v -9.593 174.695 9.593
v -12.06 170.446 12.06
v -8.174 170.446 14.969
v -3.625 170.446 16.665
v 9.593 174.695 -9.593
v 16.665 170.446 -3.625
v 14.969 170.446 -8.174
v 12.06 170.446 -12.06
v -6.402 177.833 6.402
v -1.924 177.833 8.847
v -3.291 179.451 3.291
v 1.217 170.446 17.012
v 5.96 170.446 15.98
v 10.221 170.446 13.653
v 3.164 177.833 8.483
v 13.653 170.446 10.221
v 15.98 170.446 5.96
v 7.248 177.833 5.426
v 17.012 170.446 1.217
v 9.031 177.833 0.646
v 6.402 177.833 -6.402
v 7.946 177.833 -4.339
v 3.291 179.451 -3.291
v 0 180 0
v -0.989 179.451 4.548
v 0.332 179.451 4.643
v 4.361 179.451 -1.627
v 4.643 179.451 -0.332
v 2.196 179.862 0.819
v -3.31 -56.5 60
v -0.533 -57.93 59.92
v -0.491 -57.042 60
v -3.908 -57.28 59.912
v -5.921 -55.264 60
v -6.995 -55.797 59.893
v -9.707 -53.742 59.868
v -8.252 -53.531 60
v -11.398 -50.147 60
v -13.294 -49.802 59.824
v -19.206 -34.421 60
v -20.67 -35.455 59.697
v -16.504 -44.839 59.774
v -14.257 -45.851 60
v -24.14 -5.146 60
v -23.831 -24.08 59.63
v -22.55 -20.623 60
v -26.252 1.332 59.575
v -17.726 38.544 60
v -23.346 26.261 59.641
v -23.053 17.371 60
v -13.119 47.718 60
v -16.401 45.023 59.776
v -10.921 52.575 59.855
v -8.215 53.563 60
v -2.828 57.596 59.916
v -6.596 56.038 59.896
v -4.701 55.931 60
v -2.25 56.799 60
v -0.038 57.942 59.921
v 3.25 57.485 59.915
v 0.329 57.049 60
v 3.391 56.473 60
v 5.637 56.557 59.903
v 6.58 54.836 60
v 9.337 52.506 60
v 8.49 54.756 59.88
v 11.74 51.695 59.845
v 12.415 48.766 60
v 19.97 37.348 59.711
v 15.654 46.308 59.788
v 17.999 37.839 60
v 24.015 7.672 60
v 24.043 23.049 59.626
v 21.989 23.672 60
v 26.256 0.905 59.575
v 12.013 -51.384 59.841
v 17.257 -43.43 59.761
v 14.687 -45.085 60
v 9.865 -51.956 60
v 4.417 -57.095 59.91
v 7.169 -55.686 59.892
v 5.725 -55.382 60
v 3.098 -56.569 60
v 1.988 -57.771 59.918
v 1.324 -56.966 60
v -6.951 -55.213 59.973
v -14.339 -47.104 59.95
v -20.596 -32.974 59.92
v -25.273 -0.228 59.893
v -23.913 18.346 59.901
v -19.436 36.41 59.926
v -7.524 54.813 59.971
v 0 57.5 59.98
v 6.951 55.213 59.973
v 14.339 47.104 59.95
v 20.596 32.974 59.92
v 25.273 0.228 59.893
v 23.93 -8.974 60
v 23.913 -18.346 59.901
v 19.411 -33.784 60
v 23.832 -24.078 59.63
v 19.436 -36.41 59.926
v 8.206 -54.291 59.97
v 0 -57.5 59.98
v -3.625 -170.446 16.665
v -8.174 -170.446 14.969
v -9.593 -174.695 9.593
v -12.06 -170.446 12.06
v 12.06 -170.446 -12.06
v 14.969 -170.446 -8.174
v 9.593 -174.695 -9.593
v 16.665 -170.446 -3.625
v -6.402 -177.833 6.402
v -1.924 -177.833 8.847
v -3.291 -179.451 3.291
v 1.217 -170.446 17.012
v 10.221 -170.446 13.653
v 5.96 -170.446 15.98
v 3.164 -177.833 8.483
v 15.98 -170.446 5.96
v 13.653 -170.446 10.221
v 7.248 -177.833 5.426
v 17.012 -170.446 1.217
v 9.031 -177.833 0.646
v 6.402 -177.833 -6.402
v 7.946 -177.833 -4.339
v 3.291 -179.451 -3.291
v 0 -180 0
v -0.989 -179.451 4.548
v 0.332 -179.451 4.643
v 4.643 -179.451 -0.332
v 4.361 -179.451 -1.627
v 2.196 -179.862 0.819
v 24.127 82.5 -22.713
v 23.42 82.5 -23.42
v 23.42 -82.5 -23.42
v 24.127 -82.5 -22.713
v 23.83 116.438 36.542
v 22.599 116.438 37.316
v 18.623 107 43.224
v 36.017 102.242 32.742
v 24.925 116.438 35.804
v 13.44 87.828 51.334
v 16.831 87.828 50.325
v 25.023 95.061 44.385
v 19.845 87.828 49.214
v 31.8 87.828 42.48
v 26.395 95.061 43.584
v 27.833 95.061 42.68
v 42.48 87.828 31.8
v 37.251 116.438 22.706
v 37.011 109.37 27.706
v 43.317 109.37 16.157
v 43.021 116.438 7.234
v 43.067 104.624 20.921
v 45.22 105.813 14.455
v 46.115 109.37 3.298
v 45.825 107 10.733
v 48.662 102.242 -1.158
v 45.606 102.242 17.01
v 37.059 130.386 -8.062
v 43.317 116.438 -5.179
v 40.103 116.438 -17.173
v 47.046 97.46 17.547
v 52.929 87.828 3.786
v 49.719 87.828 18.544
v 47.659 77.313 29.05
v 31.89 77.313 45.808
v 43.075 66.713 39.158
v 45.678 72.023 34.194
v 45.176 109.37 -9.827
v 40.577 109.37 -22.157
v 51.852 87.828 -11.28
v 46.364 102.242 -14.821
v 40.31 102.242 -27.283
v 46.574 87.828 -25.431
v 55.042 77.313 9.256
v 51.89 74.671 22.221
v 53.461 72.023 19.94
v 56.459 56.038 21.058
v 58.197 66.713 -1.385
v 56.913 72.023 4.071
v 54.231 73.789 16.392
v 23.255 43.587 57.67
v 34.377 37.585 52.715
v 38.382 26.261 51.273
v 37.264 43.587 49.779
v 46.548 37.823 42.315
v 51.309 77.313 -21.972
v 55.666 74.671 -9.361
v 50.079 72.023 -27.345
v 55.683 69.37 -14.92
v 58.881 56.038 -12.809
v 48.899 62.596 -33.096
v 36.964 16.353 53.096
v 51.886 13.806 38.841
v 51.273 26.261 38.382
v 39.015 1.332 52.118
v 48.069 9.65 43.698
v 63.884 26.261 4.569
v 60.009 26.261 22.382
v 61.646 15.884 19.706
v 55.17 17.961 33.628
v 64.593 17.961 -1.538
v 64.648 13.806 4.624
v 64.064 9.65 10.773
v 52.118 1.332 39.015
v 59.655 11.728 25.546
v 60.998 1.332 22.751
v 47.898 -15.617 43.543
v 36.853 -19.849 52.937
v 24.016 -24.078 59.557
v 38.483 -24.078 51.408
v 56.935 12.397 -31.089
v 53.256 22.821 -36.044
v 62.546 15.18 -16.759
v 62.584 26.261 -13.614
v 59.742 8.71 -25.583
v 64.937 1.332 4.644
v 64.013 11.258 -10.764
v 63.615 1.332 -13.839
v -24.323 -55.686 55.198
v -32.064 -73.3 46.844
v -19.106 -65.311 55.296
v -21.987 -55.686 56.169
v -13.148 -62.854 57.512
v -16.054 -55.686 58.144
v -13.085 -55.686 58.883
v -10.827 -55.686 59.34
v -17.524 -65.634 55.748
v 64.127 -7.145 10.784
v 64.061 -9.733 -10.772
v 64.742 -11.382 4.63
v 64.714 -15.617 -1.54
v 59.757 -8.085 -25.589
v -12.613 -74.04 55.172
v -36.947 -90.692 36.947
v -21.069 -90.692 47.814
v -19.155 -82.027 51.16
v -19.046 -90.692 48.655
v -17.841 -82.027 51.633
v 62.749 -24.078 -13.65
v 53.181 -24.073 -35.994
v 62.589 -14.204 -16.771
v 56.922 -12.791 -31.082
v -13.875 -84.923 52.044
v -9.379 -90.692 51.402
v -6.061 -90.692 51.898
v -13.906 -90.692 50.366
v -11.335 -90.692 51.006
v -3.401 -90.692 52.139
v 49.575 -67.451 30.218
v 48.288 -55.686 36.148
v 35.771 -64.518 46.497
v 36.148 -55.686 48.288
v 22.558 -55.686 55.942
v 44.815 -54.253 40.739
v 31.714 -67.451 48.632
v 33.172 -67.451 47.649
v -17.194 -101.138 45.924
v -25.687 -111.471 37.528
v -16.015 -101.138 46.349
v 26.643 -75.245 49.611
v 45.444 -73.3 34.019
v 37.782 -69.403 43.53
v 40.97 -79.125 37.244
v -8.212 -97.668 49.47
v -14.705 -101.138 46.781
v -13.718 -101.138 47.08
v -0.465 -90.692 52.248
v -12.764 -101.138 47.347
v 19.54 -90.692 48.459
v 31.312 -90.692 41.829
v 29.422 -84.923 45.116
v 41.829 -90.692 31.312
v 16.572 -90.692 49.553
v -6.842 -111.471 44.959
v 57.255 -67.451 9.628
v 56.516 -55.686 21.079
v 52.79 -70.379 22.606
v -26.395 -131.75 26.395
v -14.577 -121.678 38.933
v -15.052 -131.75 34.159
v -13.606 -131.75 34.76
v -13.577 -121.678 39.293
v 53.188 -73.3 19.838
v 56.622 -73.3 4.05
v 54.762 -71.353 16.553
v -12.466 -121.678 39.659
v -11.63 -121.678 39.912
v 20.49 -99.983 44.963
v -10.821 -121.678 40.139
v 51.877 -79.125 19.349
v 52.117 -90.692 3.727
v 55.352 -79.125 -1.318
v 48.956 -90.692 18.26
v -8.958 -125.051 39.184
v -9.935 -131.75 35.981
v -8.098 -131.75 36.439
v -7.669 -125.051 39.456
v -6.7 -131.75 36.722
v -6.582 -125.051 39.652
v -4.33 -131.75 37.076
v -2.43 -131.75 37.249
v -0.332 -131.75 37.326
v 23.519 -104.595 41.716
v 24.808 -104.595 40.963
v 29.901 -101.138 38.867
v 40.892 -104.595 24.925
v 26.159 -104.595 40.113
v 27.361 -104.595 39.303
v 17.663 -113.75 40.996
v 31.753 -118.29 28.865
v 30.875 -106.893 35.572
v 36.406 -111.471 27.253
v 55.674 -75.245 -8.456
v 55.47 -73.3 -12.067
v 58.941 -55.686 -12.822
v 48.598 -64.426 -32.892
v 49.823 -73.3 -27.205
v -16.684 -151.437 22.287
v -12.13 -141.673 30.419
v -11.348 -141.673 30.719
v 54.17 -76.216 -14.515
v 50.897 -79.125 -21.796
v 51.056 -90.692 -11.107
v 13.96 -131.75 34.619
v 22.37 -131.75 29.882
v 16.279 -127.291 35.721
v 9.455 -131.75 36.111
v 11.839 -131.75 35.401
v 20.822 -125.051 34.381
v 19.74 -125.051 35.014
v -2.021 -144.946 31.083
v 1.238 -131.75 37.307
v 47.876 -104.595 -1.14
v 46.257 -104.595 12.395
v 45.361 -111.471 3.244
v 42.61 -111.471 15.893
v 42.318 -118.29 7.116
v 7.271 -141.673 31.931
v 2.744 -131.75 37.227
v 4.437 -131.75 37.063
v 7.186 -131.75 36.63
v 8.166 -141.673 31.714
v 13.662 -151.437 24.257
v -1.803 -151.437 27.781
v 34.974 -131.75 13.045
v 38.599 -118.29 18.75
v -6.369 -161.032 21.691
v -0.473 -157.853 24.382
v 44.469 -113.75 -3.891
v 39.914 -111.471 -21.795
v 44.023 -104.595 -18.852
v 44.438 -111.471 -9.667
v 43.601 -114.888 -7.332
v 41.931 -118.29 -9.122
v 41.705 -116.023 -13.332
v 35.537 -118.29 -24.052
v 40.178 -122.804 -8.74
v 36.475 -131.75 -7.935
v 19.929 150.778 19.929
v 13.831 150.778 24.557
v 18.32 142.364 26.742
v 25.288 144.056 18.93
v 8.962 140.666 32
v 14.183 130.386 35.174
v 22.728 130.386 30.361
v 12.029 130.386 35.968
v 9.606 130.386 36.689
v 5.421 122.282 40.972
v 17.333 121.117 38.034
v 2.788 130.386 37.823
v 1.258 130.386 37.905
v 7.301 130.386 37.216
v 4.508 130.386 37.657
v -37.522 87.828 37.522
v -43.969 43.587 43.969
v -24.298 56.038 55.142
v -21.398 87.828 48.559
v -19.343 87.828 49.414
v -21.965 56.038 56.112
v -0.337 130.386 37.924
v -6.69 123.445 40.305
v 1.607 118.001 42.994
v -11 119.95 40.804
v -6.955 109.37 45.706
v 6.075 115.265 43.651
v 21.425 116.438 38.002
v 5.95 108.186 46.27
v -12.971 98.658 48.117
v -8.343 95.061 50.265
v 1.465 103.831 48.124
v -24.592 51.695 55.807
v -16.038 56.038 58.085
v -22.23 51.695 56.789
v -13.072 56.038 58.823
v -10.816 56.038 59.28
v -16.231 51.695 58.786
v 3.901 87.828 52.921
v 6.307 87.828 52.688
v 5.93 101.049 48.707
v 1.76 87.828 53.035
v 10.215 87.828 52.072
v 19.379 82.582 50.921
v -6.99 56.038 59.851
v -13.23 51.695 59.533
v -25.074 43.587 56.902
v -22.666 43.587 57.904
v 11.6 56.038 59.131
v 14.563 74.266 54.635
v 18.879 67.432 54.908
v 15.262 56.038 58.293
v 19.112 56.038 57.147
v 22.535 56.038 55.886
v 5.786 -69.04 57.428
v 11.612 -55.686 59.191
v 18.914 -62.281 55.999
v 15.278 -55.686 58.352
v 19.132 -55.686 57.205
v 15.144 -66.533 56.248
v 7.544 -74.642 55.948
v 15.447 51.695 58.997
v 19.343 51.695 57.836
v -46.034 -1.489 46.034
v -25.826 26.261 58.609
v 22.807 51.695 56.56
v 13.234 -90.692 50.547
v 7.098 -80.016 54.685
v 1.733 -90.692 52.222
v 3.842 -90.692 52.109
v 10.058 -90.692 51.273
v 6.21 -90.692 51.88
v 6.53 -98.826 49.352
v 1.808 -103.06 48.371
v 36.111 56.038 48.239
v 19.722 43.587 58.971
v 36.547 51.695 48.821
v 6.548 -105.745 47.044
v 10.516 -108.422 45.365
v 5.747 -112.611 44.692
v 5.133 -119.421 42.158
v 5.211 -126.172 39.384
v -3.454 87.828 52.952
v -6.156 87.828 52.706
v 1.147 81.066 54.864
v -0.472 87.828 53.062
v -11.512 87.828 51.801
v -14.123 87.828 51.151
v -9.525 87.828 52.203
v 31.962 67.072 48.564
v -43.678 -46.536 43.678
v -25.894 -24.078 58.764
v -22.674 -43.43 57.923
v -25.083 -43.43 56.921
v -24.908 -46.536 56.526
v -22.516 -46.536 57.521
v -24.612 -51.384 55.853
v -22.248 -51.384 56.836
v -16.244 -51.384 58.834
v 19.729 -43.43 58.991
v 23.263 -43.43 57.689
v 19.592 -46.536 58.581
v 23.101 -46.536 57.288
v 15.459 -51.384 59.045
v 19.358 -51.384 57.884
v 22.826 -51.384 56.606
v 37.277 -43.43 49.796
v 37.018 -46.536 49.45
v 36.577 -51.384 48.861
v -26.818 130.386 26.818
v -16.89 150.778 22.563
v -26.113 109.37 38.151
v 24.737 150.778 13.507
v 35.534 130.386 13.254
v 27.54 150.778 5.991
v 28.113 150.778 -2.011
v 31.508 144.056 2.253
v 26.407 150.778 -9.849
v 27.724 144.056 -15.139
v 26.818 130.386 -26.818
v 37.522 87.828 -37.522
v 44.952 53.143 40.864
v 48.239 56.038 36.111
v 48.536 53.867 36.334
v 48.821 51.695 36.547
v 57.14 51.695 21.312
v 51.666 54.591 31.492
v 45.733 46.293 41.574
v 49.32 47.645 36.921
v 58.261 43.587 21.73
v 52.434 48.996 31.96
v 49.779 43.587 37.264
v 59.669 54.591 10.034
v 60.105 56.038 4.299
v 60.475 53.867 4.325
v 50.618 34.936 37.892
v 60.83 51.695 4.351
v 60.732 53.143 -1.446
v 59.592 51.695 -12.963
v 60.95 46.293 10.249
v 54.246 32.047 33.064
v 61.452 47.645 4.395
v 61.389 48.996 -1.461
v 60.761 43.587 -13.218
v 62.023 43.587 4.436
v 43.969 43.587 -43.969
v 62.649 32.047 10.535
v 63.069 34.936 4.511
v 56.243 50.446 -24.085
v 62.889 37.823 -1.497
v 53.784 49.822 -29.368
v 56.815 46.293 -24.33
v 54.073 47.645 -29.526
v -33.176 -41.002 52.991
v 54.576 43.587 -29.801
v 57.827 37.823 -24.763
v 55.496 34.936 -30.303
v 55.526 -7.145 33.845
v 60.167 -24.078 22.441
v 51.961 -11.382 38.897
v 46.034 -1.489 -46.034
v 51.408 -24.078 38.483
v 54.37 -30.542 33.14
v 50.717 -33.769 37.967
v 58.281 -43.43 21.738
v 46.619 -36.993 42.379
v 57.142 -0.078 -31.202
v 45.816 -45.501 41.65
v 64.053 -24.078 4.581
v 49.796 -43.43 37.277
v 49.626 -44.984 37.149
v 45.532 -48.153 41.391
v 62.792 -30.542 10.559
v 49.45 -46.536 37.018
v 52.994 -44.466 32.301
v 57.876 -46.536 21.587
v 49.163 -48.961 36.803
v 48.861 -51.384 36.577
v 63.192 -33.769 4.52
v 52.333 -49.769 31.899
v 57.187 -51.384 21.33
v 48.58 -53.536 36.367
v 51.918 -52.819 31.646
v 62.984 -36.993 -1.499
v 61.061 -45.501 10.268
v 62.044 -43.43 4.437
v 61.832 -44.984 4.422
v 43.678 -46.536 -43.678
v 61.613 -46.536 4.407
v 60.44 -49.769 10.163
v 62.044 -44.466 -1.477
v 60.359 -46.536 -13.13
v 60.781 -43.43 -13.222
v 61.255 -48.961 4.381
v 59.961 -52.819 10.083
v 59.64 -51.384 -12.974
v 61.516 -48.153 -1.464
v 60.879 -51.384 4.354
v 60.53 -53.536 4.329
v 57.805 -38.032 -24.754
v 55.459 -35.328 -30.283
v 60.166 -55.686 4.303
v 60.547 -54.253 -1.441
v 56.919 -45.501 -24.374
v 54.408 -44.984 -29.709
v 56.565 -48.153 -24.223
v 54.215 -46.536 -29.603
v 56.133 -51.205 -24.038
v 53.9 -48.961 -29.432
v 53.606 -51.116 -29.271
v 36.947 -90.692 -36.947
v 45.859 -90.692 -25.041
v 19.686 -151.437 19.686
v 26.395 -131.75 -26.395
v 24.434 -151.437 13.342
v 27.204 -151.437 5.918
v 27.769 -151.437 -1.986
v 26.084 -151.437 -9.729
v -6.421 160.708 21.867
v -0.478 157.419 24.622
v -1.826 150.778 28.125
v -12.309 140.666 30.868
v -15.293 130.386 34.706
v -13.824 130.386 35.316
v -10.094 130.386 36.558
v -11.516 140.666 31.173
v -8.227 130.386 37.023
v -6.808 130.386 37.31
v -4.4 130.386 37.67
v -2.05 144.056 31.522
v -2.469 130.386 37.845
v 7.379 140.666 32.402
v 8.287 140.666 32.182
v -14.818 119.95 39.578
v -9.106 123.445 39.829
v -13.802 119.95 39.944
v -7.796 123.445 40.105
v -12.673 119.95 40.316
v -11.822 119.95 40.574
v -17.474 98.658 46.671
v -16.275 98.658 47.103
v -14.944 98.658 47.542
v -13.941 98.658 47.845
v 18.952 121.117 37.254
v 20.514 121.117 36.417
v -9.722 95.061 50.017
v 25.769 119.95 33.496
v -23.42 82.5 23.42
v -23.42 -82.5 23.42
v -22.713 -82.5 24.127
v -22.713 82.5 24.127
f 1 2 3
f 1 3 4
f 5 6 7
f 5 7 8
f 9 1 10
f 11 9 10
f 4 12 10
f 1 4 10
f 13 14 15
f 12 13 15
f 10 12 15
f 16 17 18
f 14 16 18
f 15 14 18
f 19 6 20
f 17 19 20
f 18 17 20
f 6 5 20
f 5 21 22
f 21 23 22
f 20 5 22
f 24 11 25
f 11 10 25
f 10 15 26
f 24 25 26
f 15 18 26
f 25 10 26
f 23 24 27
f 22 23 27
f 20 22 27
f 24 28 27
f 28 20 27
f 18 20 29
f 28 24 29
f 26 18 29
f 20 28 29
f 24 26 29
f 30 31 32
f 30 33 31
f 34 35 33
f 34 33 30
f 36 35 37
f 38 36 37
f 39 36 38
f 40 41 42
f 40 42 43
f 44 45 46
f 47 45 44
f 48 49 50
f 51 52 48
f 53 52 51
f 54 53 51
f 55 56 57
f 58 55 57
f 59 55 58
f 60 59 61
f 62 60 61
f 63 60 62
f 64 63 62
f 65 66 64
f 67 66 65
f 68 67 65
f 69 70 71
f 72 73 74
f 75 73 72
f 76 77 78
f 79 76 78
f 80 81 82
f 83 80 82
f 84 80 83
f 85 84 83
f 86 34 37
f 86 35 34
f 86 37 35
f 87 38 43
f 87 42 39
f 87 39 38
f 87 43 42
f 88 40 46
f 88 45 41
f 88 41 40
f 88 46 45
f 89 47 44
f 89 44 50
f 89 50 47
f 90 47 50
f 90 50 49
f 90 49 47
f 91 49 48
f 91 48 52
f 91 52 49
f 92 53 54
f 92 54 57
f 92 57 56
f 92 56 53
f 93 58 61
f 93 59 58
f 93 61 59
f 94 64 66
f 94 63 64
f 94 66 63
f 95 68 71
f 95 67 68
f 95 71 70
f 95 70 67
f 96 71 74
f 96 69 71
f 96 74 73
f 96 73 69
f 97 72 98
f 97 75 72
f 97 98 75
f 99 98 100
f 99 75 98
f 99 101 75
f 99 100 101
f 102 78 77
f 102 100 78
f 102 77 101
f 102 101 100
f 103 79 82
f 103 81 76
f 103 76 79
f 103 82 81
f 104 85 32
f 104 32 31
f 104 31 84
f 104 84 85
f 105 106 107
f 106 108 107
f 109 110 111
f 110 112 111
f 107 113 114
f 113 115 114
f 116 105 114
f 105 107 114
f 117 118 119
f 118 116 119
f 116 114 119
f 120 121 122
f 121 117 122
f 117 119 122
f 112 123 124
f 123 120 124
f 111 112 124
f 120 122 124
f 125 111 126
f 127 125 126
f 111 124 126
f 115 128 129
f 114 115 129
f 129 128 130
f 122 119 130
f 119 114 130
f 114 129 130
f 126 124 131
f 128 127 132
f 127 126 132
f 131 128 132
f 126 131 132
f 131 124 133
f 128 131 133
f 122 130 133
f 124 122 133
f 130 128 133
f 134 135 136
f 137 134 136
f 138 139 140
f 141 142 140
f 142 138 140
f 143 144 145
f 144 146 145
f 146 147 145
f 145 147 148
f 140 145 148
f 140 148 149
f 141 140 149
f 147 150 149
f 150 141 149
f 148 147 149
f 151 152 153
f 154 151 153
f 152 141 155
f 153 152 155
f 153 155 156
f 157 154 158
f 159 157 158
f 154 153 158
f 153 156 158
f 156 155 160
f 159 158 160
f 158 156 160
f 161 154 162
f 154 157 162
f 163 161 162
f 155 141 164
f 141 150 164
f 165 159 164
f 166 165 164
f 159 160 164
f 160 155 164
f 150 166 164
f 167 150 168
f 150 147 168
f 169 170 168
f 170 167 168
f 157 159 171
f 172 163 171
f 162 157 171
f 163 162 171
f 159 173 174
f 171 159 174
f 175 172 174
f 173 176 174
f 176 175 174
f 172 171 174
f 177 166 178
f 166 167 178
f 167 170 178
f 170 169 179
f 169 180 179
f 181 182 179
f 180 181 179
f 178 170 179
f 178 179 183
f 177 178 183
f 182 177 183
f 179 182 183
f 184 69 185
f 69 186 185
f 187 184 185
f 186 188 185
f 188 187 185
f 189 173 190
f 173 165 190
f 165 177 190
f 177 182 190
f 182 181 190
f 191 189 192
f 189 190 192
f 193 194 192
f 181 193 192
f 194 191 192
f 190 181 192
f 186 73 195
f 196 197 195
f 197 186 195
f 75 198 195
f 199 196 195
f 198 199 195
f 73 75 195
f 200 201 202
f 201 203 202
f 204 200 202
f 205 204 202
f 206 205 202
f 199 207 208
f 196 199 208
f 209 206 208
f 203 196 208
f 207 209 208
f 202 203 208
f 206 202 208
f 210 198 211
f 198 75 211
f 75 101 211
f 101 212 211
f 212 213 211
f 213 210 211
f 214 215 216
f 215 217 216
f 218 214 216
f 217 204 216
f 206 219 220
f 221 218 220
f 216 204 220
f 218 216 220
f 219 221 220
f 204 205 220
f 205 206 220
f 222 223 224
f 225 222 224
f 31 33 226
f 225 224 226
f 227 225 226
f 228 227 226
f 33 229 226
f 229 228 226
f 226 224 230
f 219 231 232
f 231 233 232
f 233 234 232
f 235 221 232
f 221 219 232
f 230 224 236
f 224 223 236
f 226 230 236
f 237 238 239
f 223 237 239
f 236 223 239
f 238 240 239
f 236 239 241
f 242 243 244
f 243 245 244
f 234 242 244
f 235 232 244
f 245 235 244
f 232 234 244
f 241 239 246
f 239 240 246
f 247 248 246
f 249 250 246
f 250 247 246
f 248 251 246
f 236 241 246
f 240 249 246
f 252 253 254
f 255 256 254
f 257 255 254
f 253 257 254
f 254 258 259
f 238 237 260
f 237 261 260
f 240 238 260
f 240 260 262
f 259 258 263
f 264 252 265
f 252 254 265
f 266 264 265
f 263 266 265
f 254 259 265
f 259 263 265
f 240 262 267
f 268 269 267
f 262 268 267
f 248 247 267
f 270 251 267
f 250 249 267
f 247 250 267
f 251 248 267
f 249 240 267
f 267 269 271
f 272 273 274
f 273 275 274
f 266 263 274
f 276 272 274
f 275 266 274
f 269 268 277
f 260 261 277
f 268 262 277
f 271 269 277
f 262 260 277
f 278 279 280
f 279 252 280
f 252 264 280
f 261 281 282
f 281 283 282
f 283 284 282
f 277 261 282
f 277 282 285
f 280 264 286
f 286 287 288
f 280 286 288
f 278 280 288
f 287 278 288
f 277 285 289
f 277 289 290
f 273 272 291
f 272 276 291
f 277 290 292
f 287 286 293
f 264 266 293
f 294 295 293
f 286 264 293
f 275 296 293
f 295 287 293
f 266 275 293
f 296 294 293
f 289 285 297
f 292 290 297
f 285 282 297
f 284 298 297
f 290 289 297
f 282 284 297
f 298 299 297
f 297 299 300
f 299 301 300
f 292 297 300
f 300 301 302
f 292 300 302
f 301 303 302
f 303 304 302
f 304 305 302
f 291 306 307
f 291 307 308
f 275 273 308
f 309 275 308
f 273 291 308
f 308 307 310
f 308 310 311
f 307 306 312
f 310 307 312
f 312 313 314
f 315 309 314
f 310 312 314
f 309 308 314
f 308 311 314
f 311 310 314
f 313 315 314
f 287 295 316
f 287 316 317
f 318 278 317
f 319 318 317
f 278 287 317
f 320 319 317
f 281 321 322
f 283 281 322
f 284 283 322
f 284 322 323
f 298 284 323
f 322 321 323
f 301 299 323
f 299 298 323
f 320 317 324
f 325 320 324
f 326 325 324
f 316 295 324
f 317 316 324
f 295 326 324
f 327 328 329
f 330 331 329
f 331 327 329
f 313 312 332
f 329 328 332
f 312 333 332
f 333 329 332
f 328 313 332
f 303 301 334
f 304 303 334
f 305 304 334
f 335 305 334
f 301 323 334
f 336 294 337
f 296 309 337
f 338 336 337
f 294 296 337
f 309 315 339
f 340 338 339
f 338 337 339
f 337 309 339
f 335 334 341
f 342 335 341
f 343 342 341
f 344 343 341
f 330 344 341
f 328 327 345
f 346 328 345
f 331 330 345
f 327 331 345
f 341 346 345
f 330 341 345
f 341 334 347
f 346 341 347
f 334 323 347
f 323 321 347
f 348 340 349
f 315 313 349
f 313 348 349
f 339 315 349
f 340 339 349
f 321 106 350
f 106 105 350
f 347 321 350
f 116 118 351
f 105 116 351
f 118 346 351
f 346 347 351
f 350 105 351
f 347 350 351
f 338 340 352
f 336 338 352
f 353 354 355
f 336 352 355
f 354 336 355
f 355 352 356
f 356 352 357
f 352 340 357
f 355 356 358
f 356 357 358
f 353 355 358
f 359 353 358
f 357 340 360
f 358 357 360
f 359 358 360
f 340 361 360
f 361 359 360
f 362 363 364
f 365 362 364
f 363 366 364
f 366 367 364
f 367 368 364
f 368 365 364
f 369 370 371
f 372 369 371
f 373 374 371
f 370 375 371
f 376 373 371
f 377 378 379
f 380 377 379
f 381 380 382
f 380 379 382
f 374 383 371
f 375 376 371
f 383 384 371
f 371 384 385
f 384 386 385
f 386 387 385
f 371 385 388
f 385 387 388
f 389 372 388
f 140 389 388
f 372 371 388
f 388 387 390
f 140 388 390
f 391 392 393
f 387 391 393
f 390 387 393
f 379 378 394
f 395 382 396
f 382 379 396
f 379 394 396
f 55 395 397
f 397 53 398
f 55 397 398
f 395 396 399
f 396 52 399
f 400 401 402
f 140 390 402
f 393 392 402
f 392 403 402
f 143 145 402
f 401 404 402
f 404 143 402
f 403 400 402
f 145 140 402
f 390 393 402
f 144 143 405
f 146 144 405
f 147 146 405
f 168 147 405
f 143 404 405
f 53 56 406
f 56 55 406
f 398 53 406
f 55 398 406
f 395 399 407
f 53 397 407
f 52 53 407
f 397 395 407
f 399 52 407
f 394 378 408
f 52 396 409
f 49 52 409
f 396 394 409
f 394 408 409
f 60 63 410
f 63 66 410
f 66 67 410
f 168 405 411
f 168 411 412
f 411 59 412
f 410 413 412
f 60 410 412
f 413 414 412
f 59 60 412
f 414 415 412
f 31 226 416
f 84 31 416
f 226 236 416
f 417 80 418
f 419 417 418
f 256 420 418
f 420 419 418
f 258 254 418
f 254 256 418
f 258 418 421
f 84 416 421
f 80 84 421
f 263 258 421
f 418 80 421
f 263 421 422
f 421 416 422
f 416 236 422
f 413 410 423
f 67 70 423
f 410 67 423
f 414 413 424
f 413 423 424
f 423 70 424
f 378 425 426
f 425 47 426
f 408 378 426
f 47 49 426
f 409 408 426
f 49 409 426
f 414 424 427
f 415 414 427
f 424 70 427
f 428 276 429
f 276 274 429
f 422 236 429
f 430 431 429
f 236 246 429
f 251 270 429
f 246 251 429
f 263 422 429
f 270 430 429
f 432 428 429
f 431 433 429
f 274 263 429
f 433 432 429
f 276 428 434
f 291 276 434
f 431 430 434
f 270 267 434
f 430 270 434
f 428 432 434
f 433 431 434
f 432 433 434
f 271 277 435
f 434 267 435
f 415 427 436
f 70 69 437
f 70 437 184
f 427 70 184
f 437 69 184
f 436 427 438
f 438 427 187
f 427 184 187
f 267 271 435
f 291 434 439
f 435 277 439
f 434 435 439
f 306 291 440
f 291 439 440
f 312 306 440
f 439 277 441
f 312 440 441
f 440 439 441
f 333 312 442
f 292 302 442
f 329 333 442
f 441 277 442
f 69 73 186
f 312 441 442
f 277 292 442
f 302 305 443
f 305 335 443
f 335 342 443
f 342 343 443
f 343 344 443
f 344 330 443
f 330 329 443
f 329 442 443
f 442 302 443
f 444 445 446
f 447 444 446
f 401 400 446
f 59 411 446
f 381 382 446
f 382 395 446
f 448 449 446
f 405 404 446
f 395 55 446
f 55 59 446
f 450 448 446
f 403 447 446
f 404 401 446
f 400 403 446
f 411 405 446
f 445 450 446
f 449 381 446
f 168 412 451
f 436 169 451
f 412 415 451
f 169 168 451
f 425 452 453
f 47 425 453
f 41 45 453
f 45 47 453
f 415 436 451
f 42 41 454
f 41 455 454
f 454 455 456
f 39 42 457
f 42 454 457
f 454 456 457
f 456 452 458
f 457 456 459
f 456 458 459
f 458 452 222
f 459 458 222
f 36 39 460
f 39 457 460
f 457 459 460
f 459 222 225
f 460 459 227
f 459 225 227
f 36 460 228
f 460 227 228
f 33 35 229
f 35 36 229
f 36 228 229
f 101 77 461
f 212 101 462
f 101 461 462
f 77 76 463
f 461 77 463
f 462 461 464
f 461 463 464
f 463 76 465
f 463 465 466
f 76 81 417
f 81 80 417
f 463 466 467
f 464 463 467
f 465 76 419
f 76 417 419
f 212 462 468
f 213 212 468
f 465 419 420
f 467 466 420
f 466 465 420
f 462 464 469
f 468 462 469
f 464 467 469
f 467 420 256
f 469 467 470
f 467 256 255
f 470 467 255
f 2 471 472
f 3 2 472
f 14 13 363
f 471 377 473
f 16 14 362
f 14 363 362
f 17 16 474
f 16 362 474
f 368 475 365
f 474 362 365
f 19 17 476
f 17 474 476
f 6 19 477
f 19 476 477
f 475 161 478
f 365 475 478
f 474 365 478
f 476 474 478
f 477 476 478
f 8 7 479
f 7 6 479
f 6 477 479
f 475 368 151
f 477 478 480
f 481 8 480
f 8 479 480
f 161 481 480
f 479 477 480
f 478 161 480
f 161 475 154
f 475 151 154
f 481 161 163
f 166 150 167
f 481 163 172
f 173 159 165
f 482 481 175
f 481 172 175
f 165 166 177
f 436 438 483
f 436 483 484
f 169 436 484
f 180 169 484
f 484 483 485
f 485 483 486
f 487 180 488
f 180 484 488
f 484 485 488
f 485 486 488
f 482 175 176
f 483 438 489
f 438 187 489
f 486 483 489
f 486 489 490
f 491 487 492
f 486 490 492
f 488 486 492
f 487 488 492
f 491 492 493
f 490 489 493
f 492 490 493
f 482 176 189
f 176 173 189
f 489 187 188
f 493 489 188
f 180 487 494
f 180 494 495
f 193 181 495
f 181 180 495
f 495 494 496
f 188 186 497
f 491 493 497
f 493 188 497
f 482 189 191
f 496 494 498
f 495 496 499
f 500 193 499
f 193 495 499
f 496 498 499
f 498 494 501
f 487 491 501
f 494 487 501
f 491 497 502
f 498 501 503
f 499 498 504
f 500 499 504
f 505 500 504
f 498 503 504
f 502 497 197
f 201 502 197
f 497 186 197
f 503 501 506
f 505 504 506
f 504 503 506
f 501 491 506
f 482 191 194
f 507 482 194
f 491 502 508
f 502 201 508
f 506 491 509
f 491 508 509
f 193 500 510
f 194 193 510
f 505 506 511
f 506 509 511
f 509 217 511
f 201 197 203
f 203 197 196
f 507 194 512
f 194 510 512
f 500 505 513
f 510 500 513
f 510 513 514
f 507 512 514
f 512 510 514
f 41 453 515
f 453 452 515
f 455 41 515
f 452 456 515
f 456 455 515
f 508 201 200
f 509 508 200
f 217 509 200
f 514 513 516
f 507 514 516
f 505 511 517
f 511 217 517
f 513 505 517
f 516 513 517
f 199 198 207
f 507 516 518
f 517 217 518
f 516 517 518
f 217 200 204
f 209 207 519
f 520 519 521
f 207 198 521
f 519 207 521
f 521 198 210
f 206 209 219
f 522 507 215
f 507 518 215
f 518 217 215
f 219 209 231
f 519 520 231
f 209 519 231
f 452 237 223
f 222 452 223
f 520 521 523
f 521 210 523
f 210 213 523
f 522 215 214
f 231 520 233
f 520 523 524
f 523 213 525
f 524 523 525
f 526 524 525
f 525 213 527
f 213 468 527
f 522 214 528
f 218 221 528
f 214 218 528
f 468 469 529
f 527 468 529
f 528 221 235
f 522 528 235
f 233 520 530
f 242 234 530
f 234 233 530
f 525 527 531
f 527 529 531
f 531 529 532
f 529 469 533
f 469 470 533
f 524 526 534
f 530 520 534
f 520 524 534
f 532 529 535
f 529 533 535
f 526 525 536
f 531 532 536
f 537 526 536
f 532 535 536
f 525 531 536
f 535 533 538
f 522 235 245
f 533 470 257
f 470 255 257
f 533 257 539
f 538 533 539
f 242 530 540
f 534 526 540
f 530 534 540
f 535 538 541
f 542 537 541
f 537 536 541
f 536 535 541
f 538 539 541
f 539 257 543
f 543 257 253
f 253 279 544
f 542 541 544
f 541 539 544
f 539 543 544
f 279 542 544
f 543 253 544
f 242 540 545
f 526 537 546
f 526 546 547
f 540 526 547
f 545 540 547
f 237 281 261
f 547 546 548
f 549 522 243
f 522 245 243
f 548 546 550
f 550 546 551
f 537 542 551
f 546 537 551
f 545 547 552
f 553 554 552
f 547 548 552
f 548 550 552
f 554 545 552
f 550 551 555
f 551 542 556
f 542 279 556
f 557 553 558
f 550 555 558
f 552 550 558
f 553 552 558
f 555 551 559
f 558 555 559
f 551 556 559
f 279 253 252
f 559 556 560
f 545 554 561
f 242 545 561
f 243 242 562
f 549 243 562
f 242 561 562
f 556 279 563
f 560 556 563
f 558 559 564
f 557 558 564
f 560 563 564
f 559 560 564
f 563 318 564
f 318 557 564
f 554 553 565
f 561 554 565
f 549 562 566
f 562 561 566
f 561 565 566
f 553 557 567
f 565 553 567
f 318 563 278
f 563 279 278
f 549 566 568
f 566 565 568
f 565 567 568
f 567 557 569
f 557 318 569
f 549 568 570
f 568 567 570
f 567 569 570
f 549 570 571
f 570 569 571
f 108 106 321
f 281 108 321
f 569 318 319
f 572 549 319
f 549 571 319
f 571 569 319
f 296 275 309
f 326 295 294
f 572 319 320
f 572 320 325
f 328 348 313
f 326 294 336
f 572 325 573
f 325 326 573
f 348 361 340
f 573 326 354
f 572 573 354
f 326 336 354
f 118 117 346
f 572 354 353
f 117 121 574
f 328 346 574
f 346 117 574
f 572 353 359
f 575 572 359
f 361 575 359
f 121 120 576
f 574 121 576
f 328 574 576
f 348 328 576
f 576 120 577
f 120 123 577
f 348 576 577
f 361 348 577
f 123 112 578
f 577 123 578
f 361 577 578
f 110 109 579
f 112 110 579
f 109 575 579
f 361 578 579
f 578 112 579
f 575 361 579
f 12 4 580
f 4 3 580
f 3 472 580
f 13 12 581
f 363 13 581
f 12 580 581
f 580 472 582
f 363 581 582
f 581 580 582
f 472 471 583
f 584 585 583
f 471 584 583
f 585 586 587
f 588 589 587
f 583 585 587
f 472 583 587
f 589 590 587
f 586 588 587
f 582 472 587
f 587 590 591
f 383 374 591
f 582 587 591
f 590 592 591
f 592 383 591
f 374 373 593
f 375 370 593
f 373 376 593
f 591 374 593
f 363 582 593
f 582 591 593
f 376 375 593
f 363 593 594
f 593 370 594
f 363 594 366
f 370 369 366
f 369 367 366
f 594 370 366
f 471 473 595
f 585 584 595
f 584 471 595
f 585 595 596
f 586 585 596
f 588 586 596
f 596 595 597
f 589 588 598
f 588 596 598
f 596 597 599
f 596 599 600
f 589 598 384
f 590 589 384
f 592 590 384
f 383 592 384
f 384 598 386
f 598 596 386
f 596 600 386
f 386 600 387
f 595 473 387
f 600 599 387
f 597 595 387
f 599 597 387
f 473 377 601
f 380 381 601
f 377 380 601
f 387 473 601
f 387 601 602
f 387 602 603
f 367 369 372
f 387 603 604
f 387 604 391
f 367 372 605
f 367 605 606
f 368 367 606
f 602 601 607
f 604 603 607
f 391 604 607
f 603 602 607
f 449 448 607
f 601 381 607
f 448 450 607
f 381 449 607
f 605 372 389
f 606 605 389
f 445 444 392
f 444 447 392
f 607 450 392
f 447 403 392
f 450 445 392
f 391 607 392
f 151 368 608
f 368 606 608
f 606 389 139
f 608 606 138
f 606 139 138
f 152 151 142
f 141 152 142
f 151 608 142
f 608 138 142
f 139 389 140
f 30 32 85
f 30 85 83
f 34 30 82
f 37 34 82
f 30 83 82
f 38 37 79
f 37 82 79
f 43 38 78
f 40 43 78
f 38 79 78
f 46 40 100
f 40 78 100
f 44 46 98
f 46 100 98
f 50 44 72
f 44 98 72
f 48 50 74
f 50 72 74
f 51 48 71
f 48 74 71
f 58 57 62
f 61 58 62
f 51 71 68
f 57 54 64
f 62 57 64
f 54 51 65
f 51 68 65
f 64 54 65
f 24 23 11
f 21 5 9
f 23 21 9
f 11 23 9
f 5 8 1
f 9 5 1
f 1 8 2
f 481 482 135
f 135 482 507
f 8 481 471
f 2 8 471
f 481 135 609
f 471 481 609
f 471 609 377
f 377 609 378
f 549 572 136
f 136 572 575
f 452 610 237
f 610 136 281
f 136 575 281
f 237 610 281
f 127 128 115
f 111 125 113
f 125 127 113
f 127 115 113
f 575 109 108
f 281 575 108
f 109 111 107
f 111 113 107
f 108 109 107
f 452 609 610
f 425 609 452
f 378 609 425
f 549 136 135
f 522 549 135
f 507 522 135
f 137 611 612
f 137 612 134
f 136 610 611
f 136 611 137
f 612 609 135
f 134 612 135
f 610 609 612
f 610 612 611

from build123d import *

# Parameters (mm, degrees)
F2_W     = 150
F2_H     = 10
F3_DEPTH = 50
F5_DEPTH = 203
F6_W     = 66.240772
F6_H     = 165
F7_DEPTH = 1
F8_R     = 5


with BuildPart() as f1:
    # F0 (on Right) → F1 (revolve)
    with BuildSketch(Plane.YZ):
        with BuildLine():
            ThreePointArc((-170.446234, 17.055093), (-177.448849, 9.774337), (-180, 0))
            Line((-180, 0), (180, 0))
            ThreePointArc((180, 0), (177.448849, 9.774337), (170.446234, 17.055093))
            ThreePointArc((170.446234, 17.055093), (0, 65.105742), (-170.446234, 17.055093))
        make_face()
    revolve(axis=Axis((0, 0, 0), (0, 1, 0)))

    # F2 (on Right) → F3 (cut, symmetric)
    with BuildSketch(Plane.YZ):
        with Locations((0, -65)):
            Rectangle(F2_W, F2_H)
        Polygon((75, 70), (-75, 70), (-75, 60), (0, 60), (75, 60), align=None)
    extrude(amount=F3_DEPTH, both=True, mode=Mode.SUBTRACT)

    # F4 (on Front) → F5 (cut, symmetric)
    with BuildSketch(Plane.XZ):
        Polygon((68.942911, -68.942911), (-68.942911, 68.942911), (-68.942911, -68.942911), align=None)
    extrude(amount=F5_DEPTH, both=True, mode=Mode.SUBTRACT)

    # F6 (on face) → F7 (cut)
    with BuildSketch(Plane(origin=(0, 0, 0), x_dir=(0.707107, 0, -0.707107), z_dir=(-0.707107, 0, -0.707107))):
        Rectangle(F6_W, F6_H)
    extrude(amount=-F7_DEPTH, mode=Mode.SUBTRACT)

    # F8
    f8_edges = [f1.edges().sort_by_distance(p)[0] for p in [
        (0, -57.5, 60),
    ]]
    fillet(f8_edges, radius=F8_R)


solid = f1.part
